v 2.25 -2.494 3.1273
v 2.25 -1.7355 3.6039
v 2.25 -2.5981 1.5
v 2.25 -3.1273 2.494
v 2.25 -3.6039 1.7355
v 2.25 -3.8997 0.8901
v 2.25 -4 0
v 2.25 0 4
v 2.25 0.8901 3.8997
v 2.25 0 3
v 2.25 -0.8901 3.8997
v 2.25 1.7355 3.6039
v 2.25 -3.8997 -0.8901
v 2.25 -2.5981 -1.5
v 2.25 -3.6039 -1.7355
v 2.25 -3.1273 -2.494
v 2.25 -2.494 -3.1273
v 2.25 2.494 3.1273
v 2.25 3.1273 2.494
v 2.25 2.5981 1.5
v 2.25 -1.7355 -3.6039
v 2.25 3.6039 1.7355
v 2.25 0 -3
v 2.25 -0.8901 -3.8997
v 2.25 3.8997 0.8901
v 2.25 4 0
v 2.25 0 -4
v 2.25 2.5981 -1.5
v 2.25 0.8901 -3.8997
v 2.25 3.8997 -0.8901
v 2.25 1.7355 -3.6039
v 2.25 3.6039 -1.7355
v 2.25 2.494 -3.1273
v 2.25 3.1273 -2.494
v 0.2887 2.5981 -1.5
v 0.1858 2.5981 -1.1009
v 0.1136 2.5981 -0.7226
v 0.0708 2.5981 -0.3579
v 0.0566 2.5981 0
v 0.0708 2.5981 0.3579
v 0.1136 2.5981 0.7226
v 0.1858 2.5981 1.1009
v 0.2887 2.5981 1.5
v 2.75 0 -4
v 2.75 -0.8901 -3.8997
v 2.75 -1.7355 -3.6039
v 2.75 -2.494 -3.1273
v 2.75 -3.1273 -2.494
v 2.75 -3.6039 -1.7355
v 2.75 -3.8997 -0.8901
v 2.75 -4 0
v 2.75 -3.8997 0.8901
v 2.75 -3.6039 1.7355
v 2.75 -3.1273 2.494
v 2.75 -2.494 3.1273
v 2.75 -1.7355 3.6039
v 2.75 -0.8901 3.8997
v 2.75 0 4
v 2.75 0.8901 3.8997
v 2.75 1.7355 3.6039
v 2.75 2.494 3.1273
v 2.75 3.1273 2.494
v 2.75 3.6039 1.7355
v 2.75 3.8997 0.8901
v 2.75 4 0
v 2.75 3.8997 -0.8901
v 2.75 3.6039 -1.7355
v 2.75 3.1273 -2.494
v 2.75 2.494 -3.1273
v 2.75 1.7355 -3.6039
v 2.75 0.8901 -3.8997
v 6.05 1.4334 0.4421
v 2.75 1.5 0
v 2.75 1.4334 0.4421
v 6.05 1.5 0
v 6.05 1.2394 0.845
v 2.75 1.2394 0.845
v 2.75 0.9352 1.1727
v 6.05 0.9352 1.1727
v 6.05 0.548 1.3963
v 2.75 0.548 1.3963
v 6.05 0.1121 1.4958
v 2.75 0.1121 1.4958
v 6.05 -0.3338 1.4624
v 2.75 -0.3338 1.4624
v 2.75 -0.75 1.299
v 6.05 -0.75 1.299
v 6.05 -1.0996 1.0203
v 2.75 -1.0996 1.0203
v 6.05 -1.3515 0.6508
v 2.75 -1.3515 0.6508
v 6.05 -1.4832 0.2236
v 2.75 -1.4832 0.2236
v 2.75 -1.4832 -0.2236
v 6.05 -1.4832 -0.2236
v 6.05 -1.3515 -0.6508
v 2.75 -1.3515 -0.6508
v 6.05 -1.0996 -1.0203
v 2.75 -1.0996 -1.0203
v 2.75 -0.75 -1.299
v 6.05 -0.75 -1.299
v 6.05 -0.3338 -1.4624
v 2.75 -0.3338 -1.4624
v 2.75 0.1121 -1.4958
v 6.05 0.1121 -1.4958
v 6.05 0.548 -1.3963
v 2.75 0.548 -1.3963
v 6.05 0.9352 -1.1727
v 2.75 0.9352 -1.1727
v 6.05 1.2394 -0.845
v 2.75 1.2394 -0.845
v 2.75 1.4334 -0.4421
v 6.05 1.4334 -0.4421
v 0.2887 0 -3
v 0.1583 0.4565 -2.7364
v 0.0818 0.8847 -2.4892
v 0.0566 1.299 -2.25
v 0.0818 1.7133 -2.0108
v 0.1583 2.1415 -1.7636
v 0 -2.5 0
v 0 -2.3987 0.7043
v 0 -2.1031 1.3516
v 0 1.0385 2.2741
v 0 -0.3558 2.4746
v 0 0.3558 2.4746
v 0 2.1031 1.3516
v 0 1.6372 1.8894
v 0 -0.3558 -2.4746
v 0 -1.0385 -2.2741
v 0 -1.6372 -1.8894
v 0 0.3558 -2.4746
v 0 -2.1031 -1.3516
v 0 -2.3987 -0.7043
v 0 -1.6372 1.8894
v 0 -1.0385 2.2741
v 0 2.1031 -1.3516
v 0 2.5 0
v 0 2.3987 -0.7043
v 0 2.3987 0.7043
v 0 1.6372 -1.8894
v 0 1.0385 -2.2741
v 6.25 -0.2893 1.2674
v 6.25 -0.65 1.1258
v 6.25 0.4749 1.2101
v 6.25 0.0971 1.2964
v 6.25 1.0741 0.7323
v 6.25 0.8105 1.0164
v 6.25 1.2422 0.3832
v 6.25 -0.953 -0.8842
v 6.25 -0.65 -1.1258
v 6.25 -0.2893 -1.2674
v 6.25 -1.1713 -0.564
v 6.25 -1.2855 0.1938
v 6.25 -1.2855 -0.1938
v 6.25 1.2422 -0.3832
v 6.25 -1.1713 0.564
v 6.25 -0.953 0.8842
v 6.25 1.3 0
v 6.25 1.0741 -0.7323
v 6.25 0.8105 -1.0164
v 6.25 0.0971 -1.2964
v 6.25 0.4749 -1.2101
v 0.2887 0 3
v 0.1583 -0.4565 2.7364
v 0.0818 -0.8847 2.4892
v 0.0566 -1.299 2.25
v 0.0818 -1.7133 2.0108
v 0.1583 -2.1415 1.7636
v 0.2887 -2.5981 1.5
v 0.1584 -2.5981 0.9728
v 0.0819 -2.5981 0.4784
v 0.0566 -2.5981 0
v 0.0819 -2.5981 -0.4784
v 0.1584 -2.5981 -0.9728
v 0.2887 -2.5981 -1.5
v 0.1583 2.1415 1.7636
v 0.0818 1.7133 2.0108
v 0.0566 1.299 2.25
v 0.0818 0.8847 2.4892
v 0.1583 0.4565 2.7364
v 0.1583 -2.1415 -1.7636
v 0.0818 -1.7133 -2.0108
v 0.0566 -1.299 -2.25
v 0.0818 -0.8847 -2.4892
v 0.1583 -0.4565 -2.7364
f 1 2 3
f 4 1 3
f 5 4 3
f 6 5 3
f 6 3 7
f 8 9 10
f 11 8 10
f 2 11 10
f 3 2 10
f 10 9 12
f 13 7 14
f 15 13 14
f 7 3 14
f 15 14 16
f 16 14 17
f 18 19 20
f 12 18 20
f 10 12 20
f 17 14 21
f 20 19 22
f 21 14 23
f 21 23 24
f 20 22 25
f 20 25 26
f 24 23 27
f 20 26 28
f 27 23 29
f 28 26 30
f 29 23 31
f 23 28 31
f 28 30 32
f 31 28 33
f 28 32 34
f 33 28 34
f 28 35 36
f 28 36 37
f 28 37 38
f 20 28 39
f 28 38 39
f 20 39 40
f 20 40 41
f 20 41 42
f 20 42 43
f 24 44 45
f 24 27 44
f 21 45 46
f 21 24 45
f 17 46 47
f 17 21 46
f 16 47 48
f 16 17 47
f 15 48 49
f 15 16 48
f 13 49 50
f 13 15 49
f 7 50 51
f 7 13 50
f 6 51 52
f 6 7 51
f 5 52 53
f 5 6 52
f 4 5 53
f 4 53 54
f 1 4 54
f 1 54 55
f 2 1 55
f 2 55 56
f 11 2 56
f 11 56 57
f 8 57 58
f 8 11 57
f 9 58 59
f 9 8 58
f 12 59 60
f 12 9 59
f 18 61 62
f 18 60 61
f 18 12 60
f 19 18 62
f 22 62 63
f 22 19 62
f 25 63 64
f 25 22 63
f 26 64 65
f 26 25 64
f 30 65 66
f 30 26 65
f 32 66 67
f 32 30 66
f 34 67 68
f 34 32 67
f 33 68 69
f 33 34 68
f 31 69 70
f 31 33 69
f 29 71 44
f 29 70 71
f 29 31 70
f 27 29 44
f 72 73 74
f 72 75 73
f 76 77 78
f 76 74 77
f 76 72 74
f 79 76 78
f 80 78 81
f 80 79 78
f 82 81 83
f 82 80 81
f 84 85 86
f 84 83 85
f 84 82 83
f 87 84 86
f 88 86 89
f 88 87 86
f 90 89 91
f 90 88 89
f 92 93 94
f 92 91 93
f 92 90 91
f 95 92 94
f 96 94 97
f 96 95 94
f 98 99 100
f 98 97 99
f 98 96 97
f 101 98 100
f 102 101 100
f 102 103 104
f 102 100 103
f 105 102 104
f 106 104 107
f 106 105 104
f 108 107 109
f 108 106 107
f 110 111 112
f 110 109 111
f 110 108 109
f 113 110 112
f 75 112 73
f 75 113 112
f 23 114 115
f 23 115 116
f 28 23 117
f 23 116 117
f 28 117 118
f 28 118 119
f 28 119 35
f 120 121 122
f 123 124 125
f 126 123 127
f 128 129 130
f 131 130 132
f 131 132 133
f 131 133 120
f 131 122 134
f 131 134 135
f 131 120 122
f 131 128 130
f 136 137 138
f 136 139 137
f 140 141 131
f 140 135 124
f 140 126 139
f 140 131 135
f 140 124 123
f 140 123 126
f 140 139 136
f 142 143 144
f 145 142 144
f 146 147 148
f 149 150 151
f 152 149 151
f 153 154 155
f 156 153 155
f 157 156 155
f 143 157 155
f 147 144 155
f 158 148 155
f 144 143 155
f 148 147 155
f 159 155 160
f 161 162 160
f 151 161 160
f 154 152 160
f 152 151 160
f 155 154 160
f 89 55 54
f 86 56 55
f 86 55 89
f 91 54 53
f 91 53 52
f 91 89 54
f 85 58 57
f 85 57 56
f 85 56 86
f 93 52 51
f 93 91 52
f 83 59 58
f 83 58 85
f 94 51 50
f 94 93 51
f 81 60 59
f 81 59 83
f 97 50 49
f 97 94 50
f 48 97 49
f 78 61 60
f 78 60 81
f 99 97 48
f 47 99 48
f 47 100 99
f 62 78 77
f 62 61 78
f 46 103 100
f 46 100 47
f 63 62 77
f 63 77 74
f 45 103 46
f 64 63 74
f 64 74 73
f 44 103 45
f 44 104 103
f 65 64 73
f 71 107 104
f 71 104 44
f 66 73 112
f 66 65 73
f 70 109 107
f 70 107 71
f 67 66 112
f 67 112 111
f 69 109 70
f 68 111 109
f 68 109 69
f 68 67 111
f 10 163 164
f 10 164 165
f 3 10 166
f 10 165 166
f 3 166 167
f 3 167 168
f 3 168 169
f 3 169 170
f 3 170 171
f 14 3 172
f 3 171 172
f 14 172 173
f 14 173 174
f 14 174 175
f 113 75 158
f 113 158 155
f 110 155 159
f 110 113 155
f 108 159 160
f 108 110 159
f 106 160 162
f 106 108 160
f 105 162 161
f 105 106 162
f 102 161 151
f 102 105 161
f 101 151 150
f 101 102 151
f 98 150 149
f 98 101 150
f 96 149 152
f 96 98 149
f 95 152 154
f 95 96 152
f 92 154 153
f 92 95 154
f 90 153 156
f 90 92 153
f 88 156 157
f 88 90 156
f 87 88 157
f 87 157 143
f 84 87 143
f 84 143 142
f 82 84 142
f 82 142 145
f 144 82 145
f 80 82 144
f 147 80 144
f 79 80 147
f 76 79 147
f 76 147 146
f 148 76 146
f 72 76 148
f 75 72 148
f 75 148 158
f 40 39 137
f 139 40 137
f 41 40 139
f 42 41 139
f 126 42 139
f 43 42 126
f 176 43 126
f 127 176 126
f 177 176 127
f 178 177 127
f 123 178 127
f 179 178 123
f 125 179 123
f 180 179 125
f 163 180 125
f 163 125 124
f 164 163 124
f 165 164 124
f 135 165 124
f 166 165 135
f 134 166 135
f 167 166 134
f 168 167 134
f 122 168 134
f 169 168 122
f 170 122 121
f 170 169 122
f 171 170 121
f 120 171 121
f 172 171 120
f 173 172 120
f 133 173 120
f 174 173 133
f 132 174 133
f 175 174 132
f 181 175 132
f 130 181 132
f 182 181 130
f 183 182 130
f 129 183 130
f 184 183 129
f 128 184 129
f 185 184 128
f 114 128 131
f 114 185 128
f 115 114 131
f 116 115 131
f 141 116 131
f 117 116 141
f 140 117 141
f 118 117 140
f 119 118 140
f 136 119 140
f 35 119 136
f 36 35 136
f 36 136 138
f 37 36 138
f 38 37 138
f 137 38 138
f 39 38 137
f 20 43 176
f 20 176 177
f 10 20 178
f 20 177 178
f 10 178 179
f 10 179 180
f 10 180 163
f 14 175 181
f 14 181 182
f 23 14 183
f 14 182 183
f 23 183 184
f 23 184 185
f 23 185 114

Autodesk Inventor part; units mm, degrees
ref_plane "YZ Plane" through (0, 0, 0) normal (1, 0, 0) x (0, 1, 0)
ref_plane "XZ Plane" through (0, 0, 0) normal (0, 1, 0) x (-1, 0, 0)
ref_plane "XY Plane" through (0, 0, 0) normal (0, 0, 1) x (1, 0, 0)
sketch "Sketch15" plane through (0, 0, 0) normal (0, 0, 1) x (1, 0, 0)
  line L0 (0, 0) -> (0, 2.5)
  line L1 (0.2887, 3) -> (2.25, 3)
  line L2 (3, 4.4) -> (3, 4.4)
  line L3 (2.25, 1.5) -> (6.25, 1.5)
  line L4 (6.25, 0) -> (0, 0)
  line L5 (0.2887, 3) -> (0, 2.5)
  line L6 (2.25, 1.5) -> (2.25, 3)
  line L7 (6.25, 1.5) -> (6.25, 0)
  dimension "d83" = 30
  dimension "d84" = 1.5
  dimension "d86" = 0.5
  dimension "d87" = 3
  dimension "d116" = 2.25
  dimension "d117" = 4
revolve "Revolution1" add sketch "Sketch15" angle 360 about axis through (6.25, 0, 0) along (-1, 0, 0)
sketch "Sketch16" plane through (0, 0, 0) normal (-1, 0, 0) x (0, 0, 1)
  circle A0 centre (0, 0) radius 2.5 projected
  line L0 (1.5, 2.5981) -> (3, 0)
  line L1 (3, 0) -> (1.5, -2.5981)
  line L2 (1.5, -2.5981) -> (-1.5, -2.5981)
  line L3 (-1.5, -2.5981) -> (-3, 0)
  line L4 (-3, 0) -> (-1.5, 2.5981)
  line L5 (-1.5, 2.5981) -> (1.5, 2.5981)
  circle A1 centre (0, 0) radius 5.2707
  dimension "d128" = 3
extrude "Extrusion15" cut sketch "Sketch16" against normal blind 5 contours A1
chamfer "Chamfer5" distance 0.2 angle 45 1 edges at (6.25, -1.5, 0)
thread "Thread7" size "M3x0.5" class "6g" standard "ANSI Metric M Profile" full length
sketch "Sketch19" plane through (2.25, -2.5981, 1.5) normal (1, 0, 0) x (0, 0, -1)
  circle A0 centre (1.5, 2.5981) radius 1.5 projected
  circle A1 centre (1.5, 2.5981) radius 4
  dimension "d131" = 8
extrude "Extrusion18" add sketch "Sketch19" along normal blind 0.5
sketch "Boceto20" plane through (0, 0, 0) normal (-1, 0, 0) x (0, 0, 1)
  circle A0 centre (0, 0) radius 1.3 projected
properties part number "Bolt3W" material "Acero, alta resistencia, aleación baja"
